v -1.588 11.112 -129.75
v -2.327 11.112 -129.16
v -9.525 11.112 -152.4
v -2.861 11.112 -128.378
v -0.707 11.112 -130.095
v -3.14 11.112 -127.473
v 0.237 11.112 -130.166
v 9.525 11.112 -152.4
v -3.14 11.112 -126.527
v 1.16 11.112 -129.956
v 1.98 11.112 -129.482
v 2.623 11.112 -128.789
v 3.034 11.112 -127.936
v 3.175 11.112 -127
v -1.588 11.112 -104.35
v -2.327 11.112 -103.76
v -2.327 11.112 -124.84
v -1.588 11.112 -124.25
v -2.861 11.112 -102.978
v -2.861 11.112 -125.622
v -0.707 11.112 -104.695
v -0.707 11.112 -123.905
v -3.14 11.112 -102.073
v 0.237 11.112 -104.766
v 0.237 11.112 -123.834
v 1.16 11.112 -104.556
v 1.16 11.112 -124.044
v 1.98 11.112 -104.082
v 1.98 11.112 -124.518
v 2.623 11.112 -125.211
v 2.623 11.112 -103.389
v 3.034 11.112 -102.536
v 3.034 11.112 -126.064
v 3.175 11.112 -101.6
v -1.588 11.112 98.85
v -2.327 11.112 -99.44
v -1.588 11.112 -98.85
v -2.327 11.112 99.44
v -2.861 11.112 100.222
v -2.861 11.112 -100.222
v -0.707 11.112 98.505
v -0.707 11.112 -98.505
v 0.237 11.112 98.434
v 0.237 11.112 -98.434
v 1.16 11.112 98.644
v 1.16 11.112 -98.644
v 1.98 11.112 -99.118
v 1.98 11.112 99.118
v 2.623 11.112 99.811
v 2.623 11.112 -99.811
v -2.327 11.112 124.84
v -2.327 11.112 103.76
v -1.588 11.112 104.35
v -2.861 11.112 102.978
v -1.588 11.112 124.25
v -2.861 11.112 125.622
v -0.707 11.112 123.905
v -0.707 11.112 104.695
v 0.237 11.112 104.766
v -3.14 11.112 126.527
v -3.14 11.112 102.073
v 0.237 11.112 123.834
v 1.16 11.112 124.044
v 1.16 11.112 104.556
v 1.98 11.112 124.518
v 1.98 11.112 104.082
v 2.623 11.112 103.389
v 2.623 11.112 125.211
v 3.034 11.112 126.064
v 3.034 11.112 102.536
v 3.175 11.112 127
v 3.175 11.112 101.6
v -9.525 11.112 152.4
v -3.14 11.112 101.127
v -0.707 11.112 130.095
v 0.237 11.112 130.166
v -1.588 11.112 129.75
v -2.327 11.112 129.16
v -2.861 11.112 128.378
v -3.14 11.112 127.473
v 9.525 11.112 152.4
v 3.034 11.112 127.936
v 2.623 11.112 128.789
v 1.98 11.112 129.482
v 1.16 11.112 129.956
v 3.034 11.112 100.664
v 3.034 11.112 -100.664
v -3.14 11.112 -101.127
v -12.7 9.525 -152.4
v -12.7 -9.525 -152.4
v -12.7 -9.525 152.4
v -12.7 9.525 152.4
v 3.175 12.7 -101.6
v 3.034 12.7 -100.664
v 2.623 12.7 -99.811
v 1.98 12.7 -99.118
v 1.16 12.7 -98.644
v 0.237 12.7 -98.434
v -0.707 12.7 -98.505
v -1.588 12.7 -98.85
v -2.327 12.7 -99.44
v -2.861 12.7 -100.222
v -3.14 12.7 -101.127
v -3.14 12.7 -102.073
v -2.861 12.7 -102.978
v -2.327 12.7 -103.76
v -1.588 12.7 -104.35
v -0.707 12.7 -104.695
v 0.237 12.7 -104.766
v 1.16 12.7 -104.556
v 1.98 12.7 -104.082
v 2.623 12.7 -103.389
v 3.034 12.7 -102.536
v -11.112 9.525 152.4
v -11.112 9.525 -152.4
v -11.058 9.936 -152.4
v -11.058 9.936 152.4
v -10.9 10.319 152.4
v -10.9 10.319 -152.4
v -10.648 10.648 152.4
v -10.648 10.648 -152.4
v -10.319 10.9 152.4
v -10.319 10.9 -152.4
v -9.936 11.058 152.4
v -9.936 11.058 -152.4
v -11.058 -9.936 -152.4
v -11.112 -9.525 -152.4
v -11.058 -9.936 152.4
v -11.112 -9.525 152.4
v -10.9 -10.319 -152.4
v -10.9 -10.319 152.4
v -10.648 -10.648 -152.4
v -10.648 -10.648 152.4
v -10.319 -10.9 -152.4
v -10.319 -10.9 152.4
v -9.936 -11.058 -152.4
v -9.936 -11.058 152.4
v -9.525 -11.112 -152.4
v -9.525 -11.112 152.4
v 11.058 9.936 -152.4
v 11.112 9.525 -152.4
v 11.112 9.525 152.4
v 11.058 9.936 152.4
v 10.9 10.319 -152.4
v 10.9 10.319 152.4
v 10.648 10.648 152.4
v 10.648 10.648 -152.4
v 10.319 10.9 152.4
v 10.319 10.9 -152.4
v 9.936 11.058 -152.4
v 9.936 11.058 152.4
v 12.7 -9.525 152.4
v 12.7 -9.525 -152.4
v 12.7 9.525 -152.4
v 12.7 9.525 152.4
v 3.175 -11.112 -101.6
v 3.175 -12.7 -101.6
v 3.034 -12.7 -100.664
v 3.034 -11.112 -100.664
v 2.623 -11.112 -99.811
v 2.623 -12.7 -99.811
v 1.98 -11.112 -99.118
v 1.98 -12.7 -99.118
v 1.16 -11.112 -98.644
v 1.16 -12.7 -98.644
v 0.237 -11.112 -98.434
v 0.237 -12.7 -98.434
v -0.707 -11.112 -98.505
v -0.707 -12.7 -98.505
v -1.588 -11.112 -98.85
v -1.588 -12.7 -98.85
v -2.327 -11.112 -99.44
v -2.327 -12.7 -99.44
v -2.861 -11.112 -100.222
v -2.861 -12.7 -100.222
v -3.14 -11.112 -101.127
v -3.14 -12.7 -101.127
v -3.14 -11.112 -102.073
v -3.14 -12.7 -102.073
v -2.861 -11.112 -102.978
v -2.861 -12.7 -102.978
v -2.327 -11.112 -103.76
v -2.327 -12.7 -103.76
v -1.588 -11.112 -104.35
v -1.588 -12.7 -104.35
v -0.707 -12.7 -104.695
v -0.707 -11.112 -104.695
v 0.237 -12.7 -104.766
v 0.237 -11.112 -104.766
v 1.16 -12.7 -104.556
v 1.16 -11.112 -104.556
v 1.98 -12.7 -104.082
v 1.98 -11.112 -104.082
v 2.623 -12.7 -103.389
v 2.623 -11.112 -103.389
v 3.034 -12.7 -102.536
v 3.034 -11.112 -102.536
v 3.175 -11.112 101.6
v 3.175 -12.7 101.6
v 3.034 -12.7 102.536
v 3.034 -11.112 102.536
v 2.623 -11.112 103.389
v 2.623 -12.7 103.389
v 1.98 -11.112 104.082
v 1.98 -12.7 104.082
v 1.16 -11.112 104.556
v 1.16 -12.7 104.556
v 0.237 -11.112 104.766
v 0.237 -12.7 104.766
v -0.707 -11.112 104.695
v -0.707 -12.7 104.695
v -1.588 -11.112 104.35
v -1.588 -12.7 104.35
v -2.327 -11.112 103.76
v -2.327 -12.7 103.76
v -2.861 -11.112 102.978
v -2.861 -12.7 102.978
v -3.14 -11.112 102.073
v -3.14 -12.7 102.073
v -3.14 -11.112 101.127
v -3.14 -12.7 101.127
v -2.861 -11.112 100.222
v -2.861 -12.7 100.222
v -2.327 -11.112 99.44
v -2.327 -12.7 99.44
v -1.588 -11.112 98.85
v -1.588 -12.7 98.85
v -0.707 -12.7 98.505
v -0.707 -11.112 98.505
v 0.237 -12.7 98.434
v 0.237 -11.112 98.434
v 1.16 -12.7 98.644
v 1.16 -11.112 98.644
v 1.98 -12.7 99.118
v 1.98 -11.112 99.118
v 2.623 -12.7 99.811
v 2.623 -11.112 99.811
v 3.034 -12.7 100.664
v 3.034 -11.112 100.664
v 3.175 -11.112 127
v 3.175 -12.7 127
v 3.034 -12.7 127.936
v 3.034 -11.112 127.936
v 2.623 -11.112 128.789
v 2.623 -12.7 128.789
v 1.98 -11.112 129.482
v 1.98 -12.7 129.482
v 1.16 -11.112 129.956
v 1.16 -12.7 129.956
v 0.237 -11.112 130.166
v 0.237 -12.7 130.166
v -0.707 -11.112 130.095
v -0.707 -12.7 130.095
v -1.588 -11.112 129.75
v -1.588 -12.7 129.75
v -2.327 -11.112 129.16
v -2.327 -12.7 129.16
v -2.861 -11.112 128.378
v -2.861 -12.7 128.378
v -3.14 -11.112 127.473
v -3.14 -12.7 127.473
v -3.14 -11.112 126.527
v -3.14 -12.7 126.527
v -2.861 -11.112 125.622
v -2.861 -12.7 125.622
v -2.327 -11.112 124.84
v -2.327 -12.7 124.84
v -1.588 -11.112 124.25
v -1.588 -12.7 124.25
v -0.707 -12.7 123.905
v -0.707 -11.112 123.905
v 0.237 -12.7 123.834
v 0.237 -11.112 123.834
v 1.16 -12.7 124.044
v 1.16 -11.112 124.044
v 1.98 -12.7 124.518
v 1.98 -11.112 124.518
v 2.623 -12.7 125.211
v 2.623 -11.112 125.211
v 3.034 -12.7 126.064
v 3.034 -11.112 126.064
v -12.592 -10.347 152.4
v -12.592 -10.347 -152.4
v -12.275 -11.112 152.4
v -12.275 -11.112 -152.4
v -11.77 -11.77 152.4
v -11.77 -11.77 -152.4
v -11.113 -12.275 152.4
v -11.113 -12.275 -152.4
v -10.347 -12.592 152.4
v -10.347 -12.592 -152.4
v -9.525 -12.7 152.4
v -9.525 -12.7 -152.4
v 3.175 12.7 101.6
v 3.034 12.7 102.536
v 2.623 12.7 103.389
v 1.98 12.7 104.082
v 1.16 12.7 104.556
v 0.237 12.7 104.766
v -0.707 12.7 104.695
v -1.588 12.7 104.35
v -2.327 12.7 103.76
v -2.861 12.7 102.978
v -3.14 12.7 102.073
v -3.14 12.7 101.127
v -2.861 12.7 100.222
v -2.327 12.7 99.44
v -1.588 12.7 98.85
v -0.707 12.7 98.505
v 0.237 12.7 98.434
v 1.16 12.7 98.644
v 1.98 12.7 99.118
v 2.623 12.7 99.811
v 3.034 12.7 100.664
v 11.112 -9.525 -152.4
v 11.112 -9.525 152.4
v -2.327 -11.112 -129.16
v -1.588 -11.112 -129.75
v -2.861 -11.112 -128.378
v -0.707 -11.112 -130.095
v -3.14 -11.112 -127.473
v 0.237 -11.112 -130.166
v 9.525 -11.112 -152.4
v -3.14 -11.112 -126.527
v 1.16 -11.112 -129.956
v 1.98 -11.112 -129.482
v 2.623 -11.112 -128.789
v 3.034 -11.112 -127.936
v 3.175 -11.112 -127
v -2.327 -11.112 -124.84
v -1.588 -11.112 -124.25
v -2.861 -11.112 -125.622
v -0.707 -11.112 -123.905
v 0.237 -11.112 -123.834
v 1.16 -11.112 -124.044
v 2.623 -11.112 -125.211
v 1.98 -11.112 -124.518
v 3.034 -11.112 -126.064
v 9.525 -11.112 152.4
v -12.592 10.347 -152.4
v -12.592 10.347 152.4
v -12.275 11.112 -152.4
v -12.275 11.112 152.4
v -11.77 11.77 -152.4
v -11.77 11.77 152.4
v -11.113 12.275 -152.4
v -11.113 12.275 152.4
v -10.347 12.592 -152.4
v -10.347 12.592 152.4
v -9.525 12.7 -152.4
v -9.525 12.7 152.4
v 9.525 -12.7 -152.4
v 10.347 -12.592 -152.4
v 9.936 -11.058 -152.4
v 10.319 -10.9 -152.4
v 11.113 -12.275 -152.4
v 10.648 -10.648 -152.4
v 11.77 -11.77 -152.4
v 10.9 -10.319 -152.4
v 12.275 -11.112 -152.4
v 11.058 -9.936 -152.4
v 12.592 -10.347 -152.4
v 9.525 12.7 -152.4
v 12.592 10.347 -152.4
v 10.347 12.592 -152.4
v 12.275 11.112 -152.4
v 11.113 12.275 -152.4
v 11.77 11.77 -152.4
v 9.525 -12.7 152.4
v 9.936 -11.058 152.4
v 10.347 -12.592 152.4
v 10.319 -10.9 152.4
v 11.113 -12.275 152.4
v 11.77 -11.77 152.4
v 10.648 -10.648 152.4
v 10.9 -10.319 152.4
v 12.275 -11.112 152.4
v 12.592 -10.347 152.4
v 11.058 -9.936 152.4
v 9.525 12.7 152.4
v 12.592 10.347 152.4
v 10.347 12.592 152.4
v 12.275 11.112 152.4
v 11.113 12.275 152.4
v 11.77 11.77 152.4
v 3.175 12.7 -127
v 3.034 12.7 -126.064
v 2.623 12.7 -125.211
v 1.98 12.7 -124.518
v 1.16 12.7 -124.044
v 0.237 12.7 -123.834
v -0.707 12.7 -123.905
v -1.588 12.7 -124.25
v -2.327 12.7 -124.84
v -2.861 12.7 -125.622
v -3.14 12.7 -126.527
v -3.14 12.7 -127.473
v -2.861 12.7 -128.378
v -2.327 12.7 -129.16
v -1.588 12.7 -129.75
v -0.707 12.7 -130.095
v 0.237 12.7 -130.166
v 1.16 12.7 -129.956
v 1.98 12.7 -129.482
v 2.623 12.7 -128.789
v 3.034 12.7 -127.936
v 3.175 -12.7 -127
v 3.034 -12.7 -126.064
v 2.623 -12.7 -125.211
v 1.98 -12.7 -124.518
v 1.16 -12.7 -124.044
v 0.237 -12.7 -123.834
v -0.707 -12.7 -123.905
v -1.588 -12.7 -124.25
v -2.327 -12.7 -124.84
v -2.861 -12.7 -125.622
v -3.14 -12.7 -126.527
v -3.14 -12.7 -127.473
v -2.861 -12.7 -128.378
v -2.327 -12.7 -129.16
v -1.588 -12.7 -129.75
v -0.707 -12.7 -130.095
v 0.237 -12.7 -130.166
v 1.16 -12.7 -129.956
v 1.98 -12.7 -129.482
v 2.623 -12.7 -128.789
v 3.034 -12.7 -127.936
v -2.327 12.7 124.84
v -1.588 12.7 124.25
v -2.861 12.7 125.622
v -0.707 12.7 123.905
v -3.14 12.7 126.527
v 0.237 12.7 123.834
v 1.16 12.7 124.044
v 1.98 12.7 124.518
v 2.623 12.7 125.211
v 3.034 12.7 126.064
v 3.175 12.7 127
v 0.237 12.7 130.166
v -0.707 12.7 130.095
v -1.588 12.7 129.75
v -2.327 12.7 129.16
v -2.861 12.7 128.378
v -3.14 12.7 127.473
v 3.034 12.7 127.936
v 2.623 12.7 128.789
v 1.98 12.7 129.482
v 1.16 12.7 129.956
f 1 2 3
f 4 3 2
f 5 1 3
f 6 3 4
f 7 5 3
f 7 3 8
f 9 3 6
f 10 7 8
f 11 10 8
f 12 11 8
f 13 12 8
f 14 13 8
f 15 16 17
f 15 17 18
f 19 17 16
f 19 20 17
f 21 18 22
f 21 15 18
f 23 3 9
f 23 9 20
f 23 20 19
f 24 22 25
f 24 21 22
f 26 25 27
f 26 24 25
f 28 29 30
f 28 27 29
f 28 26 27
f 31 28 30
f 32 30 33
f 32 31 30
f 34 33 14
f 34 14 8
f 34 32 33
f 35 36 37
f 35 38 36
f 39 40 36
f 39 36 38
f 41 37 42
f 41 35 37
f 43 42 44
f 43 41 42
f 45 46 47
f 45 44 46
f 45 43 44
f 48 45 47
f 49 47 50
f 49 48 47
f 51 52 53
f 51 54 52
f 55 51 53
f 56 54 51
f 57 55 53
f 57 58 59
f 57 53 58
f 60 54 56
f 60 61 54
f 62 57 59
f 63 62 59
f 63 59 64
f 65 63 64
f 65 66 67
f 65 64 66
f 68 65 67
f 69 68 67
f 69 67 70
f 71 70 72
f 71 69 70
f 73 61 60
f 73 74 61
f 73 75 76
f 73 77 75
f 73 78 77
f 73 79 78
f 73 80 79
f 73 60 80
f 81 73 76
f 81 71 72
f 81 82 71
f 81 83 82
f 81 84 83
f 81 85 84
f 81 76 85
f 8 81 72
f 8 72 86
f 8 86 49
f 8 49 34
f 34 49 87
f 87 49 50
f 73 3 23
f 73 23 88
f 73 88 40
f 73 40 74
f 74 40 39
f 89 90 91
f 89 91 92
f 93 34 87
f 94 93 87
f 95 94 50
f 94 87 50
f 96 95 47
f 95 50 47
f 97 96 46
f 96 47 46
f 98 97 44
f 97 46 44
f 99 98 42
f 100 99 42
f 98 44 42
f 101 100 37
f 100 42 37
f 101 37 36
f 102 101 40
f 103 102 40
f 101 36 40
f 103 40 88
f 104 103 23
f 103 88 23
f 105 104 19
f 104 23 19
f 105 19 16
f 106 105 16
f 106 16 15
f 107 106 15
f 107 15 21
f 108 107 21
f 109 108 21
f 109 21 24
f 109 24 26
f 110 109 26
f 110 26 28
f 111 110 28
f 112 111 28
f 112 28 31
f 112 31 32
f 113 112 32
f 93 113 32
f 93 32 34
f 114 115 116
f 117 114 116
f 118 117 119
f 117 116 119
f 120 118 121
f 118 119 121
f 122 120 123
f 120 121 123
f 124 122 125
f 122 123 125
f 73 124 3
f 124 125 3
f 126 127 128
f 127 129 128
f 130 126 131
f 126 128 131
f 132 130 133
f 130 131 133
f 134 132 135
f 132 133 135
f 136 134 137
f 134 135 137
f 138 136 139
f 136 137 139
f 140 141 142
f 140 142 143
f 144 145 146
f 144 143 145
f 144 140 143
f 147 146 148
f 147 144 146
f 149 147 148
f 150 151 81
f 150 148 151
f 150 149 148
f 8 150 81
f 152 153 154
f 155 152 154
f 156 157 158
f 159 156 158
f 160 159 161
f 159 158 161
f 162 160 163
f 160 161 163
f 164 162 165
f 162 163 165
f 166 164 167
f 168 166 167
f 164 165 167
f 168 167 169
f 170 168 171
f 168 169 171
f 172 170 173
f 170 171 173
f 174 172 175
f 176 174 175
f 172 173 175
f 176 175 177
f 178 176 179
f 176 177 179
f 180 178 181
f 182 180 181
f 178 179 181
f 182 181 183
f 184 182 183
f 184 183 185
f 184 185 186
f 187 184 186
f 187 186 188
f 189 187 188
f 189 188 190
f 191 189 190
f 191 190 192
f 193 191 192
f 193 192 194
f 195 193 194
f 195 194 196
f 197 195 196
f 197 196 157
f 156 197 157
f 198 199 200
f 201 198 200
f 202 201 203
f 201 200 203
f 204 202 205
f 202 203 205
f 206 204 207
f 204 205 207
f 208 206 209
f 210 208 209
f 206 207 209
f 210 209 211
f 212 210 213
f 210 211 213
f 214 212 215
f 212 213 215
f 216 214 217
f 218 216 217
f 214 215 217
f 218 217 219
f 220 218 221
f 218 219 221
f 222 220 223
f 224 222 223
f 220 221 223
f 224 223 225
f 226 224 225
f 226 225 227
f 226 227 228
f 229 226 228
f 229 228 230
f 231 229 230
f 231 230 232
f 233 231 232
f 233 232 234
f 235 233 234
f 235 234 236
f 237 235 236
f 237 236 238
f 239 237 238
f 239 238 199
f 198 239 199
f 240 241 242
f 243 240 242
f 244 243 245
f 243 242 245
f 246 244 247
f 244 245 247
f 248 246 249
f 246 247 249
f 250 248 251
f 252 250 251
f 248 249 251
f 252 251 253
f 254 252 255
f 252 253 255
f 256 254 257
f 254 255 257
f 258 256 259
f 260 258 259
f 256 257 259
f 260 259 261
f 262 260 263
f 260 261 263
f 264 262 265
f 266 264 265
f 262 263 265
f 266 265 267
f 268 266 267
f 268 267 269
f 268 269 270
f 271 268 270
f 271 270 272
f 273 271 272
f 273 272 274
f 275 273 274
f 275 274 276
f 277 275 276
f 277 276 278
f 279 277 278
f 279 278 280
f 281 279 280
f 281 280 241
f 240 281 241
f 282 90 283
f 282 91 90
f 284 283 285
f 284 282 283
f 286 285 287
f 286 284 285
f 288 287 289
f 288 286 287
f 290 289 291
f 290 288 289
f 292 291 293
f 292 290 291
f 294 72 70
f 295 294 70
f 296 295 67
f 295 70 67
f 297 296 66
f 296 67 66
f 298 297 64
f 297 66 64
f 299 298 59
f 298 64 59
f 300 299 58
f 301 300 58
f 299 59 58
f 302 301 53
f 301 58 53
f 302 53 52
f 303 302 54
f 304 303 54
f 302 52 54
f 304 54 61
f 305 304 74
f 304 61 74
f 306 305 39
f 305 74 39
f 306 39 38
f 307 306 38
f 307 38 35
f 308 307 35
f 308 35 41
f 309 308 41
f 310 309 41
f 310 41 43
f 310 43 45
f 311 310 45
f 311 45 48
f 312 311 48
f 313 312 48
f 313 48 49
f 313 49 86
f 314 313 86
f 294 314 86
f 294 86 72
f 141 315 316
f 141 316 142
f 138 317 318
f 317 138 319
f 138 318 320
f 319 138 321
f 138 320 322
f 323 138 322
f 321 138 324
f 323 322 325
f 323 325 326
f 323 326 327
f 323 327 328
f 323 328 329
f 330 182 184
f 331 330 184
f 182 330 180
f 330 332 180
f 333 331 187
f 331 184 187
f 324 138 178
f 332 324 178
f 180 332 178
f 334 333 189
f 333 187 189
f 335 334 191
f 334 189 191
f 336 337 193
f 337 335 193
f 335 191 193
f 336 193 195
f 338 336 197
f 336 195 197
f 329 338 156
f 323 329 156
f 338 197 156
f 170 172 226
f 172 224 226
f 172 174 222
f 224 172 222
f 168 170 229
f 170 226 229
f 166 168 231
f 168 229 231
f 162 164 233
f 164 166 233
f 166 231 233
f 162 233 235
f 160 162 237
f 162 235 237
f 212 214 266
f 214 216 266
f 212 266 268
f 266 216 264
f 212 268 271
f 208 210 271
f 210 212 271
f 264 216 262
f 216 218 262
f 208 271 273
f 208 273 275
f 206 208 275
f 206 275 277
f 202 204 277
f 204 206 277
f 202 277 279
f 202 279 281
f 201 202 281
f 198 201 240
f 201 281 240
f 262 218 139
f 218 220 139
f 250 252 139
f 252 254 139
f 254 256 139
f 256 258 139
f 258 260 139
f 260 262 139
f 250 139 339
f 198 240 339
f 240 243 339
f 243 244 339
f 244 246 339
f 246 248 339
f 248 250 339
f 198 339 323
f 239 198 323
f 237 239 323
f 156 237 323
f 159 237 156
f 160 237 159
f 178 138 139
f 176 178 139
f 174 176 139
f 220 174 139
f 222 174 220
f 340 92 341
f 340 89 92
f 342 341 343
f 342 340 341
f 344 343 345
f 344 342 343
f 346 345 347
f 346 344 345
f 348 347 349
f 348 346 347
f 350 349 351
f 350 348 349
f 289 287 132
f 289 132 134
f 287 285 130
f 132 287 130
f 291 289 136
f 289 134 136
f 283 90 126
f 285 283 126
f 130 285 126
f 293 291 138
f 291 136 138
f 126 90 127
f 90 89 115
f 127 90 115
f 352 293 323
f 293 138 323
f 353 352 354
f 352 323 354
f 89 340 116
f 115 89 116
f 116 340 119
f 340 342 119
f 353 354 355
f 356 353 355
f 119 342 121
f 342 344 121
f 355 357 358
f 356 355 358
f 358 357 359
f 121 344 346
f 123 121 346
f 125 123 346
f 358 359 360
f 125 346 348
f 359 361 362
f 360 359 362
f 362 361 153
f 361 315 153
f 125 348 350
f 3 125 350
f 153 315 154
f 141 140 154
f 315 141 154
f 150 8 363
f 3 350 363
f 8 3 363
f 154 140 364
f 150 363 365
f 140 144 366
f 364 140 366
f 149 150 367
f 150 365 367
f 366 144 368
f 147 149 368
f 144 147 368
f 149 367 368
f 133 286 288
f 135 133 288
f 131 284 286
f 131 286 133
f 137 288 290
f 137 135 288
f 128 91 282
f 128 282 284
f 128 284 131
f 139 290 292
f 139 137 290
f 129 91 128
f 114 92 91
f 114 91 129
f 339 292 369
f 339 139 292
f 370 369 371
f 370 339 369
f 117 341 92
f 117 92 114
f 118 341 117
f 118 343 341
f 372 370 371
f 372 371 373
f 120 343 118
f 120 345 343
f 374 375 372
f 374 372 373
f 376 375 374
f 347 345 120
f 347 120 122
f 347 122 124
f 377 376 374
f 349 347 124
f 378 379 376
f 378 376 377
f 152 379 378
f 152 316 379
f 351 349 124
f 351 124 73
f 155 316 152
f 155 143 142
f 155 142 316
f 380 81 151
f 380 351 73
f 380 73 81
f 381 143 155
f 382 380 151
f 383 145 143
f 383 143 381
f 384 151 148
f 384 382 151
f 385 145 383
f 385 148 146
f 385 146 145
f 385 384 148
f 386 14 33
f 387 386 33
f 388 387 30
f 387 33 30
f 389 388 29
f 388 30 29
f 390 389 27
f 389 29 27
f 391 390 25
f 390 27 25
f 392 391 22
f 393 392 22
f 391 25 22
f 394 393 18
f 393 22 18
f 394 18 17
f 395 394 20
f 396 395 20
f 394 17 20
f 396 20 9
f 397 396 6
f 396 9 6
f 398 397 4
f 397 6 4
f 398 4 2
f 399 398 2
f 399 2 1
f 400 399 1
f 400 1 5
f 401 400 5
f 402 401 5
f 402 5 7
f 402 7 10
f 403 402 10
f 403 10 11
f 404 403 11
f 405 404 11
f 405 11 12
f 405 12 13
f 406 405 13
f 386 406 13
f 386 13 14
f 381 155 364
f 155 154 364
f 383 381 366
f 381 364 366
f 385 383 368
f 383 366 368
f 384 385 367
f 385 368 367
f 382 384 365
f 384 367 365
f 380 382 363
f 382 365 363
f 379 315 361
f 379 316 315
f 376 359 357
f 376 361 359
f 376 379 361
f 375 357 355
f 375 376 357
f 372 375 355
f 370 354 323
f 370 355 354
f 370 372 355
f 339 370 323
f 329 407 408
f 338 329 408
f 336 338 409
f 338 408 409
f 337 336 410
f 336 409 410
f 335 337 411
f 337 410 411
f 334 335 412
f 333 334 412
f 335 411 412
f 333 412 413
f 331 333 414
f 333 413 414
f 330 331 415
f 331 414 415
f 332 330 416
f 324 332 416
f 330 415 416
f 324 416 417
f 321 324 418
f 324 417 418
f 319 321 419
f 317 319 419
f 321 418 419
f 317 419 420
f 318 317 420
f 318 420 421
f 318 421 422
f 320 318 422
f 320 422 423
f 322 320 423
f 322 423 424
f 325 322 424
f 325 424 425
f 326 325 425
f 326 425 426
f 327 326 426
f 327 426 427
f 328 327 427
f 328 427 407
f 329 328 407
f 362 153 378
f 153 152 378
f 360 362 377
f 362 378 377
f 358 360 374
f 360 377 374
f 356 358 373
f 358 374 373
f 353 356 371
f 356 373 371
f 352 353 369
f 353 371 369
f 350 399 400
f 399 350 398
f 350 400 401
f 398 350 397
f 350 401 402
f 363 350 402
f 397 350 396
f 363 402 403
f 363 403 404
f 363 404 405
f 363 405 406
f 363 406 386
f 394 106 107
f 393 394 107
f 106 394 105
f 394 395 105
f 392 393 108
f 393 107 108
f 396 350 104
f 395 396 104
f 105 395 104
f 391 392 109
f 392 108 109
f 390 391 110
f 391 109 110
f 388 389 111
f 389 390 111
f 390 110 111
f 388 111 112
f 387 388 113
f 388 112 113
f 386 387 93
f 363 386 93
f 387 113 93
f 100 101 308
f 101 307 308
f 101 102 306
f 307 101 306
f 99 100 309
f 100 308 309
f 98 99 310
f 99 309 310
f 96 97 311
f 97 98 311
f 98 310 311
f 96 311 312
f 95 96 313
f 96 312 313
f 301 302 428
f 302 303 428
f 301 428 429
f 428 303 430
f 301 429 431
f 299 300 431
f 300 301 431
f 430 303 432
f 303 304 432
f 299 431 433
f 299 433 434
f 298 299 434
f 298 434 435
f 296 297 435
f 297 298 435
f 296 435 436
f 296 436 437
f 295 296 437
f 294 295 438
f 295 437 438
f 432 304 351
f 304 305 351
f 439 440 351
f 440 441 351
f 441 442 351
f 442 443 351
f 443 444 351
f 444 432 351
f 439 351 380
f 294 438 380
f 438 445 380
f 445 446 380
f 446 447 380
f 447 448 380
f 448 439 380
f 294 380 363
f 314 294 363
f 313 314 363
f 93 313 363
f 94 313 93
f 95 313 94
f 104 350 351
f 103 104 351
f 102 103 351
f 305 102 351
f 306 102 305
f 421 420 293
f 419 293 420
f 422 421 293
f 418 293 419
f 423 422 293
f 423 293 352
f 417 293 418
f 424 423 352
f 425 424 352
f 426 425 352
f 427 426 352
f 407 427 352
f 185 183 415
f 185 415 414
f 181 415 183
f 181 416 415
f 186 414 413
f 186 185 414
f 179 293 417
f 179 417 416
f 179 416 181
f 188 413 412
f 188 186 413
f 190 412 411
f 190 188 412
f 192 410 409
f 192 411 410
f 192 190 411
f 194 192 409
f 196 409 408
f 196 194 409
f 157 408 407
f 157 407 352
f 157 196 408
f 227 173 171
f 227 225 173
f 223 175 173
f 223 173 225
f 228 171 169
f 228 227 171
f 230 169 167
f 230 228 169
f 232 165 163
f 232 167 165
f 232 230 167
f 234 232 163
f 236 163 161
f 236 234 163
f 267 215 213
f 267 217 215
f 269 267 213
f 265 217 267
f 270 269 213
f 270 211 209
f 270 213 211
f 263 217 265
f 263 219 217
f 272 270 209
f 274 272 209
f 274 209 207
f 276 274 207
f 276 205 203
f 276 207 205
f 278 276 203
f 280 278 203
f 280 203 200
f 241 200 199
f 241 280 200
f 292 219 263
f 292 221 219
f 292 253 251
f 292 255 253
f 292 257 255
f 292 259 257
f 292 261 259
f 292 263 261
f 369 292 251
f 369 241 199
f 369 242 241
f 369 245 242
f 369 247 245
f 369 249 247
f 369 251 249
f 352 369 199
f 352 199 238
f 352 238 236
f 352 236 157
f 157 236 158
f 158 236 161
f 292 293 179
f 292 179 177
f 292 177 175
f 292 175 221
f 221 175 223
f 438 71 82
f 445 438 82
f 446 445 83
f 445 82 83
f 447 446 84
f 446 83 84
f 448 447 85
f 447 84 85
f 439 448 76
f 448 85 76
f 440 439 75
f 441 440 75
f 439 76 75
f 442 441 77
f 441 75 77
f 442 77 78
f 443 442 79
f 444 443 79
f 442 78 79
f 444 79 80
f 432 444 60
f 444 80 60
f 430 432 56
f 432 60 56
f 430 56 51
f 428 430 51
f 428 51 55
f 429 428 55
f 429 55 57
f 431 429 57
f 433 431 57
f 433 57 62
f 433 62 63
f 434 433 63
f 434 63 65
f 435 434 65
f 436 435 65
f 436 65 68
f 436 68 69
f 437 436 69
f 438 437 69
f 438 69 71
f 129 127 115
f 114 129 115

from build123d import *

# Parameters (mm, degrees)
SKETCH1_W          = 25.4
SKETCH1_H          = 25.4
BASE_EXTRUDE_DEPTH = 152.4
FILLET1_R          = 3.175
SHELL1_T           = -1.5875
SKETCH5_R          = 3.175
CUT_EXTRUDE2_DEPTH = 156.02325632


with BuildPart() as part:
    # Sketch1 → Base-Extrude (new, symmetric)
    with BuildSketch(Plane.XY):
        Rectangle(SKETCH1_W, SKETCH1_H)
    extrude(amount=BASE_EXTRUDE_DEPTH, both=True)

    # Fillet1
    fillet1_edges = [part.edges().sort_by_distance(p)[0] for p in [
        (-12.7, 12.7, 0),
        (12.7, 12.7, 0),
        (12.7, -12.7, 0),
        (-12.7, -12.7, 0),
    ]]
    fillet(fillet1_edges, radius=FILLET1_R)

    # Shell1
    shell1_openings = [part.faces().sort_by_distance(p)[0] for p in [
        (0, 0, 152.4),
        (0, 0, -152.4),
    ]]
    offset(amount=SHELL1_T, openings=shell1_openings, kind=Kind.INTERSECTION)

    # Sketch5 → Cut-Extrude2 (cut, through all)
    with BuildSketch(Plane.XZ.offset(12.7)):
        with Locations((0, 127)):
            Circle(SKETCH5_R)
        with Locations((0, 101.6)):
            Circle(SKETCH5_R)
        with Locations((0, -127)):
            Circle(SKETCH5_R)
        with Locations((0, -101.6)):
            Circle(SKETCH5_R)
    extrude(amount=-CUT_EXTRUDE2_DEPTH, mode=Mode.SUBTRACT)


solid = part.part
